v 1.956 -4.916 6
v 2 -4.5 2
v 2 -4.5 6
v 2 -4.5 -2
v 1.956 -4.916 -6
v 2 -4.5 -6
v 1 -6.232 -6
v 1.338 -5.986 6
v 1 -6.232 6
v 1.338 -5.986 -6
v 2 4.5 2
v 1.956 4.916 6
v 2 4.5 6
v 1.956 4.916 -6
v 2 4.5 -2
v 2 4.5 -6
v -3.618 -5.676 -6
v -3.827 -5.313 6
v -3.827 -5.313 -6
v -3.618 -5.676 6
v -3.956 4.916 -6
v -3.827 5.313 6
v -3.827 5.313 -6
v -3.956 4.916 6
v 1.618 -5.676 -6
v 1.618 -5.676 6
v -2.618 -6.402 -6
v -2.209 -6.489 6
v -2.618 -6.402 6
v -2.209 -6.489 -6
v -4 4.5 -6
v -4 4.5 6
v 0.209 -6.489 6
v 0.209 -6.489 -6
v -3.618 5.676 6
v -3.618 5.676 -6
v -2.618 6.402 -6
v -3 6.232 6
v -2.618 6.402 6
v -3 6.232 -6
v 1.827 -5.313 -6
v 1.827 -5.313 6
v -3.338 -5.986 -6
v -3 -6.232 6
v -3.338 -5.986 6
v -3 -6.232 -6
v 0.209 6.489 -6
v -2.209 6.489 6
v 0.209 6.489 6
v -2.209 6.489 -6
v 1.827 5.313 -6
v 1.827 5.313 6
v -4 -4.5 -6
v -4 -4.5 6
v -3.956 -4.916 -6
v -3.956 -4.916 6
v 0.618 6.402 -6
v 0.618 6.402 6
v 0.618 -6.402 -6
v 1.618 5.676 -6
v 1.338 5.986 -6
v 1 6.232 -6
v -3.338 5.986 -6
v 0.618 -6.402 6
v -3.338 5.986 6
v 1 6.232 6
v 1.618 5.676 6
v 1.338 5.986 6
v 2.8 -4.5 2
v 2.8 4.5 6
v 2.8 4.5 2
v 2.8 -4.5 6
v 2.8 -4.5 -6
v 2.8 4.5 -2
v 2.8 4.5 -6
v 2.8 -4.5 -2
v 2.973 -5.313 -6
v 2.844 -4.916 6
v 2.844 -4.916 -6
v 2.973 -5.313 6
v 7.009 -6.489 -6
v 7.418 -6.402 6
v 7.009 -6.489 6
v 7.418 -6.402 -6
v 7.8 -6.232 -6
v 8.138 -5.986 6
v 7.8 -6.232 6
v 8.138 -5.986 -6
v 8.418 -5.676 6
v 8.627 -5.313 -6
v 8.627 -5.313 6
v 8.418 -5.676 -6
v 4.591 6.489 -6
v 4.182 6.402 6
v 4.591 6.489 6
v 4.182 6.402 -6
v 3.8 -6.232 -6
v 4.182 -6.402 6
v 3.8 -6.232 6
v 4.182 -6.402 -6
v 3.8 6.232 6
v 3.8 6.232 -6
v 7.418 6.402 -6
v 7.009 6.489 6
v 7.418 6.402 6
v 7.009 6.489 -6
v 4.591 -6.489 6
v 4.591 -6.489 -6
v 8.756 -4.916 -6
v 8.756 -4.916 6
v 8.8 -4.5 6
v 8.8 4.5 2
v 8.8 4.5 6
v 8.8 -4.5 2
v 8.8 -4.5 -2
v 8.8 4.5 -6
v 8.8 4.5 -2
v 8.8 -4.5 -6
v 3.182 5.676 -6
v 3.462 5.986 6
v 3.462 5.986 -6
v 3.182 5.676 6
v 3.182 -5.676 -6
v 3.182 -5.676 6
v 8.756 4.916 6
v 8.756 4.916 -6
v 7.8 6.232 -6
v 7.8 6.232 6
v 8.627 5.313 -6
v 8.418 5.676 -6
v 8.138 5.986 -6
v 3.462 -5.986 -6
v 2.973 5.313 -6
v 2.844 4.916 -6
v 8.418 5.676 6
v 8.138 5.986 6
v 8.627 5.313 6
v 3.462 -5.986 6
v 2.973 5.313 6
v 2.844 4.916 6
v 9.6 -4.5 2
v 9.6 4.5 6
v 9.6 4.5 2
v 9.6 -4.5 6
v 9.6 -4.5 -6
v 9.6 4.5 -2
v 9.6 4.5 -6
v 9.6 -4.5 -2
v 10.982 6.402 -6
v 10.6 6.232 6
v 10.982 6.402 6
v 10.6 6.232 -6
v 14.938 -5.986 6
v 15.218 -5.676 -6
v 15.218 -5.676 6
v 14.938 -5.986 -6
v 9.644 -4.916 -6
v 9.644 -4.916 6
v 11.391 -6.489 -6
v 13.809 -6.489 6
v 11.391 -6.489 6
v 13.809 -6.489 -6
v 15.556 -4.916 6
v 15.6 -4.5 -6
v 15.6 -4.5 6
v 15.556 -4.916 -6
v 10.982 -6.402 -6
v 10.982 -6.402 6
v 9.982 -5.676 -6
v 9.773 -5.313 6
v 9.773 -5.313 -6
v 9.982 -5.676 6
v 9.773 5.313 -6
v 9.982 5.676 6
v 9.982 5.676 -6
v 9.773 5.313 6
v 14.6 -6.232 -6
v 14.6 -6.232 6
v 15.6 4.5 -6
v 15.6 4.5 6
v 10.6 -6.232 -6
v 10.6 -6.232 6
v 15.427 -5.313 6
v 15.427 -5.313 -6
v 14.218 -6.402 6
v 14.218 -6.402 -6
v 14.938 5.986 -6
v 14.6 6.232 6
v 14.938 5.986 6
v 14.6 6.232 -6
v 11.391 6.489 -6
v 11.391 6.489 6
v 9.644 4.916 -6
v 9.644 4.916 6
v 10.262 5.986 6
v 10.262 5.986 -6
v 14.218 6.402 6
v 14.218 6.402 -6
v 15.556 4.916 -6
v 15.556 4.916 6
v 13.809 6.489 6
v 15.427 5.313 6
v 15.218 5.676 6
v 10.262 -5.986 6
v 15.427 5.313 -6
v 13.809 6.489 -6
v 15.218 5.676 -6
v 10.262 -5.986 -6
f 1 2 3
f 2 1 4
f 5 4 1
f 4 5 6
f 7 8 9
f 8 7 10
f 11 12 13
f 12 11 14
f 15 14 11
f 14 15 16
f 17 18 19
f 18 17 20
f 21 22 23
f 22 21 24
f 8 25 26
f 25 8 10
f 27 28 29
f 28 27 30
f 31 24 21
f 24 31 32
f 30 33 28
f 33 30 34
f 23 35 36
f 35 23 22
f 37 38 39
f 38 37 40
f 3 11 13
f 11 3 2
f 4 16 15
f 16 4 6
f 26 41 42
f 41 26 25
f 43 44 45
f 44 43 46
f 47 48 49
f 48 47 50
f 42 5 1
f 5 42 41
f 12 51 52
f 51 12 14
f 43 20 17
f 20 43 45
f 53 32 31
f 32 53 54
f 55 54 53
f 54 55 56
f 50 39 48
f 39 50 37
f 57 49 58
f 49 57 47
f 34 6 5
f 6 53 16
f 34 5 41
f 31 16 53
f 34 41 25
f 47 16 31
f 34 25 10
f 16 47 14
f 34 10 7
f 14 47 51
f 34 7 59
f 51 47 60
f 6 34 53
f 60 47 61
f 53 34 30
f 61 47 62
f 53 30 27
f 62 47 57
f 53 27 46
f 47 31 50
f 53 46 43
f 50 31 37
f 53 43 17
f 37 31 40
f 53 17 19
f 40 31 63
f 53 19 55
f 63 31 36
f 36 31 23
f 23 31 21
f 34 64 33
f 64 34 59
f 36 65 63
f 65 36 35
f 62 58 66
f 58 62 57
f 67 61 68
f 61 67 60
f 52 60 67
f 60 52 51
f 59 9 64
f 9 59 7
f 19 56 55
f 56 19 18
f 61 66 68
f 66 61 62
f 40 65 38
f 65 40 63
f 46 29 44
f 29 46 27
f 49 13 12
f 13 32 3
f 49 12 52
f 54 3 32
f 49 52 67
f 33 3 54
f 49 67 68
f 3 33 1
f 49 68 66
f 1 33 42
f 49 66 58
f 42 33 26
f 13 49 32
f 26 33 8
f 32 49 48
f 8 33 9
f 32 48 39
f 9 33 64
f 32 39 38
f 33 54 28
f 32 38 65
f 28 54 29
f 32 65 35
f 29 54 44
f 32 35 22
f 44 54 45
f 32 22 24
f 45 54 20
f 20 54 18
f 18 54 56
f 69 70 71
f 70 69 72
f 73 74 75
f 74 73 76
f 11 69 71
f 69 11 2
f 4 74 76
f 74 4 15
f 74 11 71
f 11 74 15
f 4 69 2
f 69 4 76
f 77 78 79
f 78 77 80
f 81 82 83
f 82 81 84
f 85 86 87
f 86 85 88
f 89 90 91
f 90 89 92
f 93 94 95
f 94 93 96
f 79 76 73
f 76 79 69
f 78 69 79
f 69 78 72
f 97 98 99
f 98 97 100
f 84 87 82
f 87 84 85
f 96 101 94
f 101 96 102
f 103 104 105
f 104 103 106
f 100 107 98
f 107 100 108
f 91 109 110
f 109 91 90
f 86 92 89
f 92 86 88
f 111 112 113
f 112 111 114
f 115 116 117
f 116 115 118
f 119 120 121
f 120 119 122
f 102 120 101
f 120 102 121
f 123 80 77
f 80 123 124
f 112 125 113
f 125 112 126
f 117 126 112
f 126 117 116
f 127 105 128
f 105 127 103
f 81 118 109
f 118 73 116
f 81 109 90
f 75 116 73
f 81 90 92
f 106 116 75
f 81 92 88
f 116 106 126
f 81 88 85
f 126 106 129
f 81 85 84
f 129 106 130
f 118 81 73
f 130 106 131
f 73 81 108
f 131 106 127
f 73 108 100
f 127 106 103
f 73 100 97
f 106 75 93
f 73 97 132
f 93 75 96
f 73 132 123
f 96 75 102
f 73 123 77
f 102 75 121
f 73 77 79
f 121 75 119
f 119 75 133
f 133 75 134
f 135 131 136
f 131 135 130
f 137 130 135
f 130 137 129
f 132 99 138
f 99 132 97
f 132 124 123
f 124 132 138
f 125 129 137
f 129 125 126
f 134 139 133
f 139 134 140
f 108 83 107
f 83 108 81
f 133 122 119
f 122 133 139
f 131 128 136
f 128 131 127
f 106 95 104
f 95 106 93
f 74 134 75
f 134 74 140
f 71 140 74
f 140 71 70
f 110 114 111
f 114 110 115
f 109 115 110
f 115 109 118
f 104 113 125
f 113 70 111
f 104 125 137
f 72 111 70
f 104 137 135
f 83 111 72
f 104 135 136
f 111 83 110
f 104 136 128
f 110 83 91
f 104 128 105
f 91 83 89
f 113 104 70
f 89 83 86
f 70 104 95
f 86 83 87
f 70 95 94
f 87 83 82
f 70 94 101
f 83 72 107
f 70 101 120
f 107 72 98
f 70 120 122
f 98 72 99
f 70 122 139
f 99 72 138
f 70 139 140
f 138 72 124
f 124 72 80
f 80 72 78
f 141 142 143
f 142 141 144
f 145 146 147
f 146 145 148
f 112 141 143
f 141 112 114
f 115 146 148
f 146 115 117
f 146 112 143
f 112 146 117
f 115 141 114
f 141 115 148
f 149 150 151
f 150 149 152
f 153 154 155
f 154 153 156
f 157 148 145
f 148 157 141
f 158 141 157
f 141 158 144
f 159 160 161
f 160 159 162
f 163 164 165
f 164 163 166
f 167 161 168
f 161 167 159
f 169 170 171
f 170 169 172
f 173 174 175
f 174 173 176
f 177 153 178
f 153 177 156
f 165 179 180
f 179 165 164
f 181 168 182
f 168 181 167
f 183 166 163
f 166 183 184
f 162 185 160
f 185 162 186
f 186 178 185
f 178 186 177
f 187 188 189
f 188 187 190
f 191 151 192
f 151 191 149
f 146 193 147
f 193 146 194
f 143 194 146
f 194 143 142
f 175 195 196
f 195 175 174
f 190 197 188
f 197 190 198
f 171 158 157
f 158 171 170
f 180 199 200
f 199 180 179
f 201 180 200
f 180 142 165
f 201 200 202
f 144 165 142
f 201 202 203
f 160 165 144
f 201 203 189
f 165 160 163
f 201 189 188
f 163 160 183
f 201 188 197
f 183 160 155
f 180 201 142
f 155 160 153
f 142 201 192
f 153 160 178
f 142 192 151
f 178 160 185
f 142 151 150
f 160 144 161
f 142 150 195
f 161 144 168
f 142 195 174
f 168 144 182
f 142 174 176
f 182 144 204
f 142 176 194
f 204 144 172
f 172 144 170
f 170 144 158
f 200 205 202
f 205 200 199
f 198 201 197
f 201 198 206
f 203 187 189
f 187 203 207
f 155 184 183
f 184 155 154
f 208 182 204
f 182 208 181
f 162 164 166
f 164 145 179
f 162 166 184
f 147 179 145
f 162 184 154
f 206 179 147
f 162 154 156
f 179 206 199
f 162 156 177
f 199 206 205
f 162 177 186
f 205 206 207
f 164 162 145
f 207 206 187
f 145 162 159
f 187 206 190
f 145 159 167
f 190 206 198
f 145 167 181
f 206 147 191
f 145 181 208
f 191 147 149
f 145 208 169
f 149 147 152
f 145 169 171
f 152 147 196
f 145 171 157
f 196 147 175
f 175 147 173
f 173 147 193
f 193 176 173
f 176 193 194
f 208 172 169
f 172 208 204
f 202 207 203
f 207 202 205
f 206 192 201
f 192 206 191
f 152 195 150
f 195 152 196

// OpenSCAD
$fn=30;
height=12;
radius=2;
union(){
    hull(){
        translate([0,-4.5,0])cylinder(r=radius,h=height, center=true);
        translate([-2,4.5,0])cylinder(r=radius,h=height, center=true);
        translate([0,4.5,0])cylinder(r=radius,h=height, center=true);
        translate([-2,-4.5,0])cylinder(r=radius,h=height, center=true);
  }
  translate([2.4,0,0])cube([radius/2.5,radius+7,radius+2],center=true);
   translate([6.8,0,0]) hull(){
        translate([0,-4.5,0])cylinder(r=radius,h=height, center=true);
        translate([-2,4.5,0])cylinder(r=radius,h=height, center=true);
        translate([0,4.5,0])cylinder(r=radius,h=height, center=true);
        translate([-2,-4.5,0])cylinder(r=radius,h=height, center=true);
  }
  translate([9.2,0,0])cube([radius/2.5,radius+7,radius+2],center=true);
   translate([13.6,0,0]) hull(){
        translate([0,-4.5,0])cylinder(r=radius,h=height, center=true);
        translate([-2,4.5,0])cylinder(r=radius,h=height, center=true);
        translate([0,4.5,0])cylinder(r=radius,h=height, center=true);
        translate([-2,-4.5,0])cylinder(r=radius,h=height, center=true);
  }
}
